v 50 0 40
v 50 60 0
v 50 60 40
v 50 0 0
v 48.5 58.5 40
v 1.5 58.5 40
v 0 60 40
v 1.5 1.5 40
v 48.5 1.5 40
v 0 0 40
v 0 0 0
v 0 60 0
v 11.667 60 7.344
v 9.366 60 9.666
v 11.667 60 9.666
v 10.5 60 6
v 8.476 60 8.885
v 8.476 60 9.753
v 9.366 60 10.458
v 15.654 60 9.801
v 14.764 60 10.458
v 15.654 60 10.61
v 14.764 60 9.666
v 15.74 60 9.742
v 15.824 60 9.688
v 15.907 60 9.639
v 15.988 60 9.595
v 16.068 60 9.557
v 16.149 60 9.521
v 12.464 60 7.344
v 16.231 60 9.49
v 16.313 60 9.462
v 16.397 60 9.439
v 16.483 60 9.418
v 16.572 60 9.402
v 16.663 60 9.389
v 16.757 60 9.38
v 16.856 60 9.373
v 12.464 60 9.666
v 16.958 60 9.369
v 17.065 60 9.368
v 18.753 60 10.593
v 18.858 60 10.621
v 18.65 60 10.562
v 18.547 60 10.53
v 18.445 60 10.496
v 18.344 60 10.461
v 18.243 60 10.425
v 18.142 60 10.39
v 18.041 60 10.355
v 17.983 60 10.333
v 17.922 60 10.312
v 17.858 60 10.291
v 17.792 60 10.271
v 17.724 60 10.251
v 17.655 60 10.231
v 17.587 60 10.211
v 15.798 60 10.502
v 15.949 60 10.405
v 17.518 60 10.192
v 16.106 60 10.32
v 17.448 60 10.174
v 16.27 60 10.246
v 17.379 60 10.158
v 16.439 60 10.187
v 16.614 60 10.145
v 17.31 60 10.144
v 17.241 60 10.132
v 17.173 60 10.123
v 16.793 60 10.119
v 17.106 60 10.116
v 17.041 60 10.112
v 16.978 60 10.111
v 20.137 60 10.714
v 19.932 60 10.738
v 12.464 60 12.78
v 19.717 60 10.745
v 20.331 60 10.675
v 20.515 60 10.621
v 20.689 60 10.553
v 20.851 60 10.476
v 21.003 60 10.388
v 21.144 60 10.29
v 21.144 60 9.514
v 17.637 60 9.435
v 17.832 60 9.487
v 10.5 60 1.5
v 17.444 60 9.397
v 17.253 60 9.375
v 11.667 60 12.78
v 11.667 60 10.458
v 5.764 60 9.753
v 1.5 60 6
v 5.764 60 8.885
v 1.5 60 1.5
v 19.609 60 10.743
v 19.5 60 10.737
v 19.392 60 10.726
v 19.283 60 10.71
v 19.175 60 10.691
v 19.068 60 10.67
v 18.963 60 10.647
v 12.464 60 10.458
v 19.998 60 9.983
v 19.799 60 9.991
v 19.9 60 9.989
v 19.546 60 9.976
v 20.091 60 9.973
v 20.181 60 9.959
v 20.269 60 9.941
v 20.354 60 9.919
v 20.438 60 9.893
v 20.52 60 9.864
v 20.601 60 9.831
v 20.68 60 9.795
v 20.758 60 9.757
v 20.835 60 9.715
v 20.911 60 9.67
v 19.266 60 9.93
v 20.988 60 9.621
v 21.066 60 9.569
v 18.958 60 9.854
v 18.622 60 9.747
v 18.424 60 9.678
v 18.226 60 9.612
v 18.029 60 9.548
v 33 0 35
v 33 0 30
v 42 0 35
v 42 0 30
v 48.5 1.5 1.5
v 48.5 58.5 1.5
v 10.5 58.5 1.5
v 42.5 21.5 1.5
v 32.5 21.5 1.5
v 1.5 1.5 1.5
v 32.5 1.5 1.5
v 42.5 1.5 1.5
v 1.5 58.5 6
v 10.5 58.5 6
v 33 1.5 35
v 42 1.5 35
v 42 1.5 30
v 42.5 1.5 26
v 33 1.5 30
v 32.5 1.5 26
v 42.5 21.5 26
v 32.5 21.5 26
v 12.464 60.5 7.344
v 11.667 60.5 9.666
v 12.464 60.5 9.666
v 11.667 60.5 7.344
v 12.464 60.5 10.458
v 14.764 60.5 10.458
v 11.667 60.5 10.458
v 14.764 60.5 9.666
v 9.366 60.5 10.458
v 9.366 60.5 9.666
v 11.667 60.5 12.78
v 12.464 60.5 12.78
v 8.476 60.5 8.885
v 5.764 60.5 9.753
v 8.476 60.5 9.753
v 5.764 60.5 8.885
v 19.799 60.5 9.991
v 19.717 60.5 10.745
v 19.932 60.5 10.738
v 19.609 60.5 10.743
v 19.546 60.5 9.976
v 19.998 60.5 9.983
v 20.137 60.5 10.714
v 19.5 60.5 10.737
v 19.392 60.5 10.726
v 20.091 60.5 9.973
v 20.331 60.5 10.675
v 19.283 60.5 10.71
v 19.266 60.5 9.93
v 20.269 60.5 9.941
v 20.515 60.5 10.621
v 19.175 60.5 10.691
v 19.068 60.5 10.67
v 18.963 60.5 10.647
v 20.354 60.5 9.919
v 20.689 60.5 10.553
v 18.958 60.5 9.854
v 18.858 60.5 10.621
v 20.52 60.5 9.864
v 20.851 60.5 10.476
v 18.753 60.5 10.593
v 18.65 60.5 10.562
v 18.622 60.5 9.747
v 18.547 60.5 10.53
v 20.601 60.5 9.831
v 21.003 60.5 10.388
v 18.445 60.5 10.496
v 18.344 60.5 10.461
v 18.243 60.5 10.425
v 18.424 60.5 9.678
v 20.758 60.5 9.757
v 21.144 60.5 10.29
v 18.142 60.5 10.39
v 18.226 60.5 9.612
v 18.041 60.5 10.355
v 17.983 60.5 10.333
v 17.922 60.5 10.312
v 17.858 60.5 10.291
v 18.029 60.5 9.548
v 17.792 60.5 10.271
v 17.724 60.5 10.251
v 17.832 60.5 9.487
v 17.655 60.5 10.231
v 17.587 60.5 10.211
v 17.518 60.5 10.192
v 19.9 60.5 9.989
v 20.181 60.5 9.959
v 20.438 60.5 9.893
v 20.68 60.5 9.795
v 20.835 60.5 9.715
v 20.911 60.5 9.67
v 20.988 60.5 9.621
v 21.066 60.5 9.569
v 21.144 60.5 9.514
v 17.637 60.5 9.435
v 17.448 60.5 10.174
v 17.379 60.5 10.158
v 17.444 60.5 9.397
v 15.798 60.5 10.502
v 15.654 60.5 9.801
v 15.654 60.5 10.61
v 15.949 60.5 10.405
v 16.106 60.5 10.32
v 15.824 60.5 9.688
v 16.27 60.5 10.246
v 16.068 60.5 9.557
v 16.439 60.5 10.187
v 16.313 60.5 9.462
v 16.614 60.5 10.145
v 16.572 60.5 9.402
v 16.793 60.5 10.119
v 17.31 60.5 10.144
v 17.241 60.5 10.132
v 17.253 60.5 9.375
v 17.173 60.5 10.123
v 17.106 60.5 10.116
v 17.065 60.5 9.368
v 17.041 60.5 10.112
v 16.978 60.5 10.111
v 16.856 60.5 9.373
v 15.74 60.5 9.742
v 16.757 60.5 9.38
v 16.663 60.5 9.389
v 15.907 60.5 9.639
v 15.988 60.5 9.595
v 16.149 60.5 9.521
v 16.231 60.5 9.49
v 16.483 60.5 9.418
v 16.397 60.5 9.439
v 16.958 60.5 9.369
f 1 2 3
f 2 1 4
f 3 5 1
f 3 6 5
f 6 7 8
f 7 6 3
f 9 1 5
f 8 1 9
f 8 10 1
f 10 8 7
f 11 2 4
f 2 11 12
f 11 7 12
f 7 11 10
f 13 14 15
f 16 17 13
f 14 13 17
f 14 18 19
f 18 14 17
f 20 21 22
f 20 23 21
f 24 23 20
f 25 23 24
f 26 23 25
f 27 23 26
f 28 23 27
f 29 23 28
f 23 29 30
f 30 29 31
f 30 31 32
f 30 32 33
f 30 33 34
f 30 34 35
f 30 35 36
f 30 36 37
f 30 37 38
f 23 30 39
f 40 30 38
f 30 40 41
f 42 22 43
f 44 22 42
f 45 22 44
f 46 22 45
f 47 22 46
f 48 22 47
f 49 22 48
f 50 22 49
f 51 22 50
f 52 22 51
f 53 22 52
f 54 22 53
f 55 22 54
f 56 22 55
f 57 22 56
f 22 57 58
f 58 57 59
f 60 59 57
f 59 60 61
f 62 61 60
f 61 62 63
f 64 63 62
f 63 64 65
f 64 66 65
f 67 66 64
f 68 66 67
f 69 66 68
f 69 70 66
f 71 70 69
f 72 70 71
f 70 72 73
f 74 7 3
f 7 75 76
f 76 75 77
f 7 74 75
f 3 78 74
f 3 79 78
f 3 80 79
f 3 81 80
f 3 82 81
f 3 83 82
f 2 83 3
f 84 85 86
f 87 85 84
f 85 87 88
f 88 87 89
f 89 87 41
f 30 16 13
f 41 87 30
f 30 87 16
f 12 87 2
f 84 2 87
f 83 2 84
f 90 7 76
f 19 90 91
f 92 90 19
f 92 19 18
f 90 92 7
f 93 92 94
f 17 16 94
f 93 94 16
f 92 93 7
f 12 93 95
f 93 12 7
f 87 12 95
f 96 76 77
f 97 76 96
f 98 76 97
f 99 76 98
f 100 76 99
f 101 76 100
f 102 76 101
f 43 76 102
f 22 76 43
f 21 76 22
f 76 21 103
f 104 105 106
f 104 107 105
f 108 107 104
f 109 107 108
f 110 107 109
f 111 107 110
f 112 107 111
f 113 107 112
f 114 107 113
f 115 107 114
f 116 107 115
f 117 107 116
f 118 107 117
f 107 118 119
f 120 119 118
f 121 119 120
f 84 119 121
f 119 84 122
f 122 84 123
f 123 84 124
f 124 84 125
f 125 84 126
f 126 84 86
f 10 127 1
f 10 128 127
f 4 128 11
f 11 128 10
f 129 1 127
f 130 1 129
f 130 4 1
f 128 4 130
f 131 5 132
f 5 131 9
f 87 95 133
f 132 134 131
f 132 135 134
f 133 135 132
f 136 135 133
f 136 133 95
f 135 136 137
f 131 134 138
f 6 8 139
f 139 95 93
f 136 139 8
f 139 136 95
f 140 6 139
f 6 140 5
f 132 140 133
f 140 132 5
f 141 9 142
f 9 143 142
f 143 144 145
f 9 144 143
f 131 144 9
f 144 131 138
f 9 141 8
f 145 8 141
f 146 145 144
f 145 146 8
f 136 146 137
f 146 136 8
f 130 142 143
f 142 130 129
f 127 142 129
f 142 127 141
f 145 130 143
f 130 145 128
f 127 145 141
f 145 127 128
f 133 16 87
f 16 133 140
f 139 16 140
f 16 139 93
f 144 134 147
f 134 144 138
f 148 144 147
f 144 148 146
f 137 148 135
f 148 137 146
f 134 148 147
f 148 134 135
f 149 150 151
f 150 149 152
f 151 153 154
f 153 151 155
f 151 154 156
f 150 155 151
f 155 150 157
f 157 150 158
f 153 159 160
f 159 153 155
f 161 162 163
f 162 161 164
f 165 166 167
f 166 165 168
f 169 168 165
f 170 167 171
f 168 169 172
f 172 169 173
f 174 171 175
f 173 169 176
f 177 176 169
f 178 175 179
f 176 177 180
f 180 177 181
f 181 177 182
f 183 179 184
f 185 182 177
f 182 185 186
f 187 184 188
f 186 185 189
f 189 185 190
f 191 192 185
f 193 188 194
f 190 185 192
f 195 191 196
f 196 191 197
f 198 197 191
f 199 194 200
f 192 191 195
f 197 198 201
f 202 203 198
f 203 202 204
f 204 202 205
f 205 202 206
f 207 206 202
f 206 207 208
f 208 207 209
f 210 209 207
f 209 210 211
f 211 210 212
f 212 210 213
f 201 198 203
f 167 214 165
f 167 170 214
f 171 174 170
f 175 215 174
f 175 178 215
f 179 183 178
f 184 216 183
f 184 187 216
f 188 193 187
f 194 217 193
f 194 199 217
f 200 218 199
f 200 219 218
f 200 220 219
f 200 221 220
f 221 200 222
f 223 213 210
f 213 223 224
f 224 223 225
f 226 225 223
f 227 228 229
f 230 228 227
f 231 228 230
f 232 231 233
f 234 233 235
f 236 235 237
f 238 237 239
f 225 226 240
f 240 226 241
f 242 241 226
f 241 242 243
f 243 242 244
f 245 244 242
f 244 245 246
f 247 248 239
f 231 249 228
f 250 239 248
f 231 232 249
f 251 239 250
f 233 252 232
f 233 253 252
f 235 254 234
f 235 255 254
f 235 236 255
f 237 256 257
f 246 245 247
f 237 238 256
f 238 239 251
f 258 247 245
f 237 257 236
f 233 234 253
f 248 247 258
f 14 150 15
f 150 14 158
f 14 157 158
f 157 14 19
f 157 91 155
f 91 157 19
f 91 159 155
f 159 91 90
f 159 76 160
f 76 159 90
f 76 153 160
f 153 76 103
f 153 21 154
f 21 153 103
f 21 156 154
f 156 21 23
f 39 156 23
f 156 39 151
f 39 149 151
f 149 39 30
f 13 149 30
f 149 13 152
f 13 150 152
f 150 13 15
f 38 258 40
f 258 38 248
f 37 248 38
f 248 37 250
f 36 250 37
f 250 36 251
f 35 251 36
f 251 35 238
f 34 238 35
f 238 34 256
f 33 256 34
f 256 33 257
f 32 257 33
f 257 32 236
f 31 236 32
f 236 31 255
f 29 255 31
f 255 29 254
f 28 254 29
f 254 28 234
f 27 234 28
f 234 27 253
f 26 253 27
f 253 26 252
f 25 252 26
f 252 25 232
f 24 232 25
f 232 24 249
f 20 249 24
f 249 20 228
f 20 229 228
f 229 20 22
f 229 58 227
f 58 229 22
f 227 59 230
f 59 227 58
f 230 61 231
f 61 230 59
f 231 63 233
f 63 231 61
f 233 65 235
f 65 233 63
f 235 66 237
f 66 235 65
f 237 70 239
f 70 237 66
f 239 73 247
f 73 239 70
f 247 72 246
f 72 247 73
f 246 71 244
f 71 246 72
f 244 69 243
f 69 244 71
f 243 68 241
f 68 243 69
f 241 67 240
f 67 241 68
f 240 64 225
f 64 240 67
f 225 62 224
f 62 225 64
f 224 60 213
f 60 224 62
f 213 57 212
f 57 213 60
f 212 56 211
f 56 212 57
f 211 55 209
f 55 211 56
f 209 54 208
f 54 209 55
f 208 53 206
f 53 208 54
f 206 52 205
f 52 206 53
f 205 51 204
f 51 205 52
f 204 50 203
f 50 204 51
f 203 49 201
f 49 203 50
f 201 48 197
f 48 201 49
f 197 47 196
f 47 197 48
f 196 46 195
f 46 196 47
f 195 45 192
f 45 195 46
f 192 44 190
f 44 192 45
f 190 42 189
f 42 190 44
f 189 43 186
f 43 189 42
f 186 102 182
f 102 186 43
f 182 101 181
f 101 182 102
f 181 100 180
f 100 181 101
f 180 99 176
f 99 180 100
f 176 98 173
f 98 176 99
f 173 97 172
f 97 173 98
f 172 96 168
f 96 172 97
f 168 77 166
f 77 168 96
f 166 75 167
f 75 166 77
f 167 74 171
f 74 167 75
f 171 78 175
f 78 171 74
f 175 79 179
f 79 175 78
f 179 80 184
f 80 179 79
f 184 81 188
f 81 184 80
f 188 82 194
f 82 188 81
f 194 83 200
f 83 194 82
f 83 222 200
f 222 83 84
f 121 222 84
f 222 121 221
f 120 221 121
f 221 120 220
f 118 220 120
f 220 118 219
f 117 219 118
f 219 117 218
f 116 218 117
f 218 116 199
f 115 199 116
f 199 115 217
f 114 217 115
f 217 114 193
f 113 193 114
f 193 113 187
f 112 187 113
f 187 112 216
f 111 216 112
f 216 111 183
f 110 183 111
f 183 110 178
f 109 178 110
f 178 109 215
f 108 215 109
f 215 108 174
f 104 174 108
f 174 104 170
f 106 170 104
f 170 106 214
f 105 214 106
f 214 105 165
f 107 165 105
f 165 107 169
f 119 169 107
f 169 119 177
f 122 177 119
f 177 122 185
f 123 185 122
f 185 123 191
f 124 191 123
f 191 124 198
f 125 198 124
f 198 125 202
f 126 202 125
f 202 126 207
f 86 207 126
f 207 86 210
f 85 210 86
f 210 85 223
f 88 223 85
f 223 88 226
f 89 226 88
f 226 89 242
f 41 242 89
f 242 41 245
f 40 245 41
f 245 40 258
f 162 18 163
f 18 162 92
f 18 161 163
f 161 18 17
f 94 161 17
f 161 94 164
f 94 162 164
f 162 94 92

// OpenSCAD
wall=1.5;
eps = 0.01;

module box_bottom()
{
  size = [50, 60, 40];
  difference()
  {
    cube(size);
    translate(wall*[1,1,1])
      cube(size-wall*[2,2,0]);
    // arduino USB socket
    translate([size[0]-8-9, -eps, 30])
      cube([9, 2*eps+wall, 5]);
    // servo wires
    translate([wall, size[1]-wall-eps, wall])
      cube([9, 3, 3*wall]);
  }
  // arduino support
  translate([50-8-9-0.5, wall, 0])
    cube([10, 20, 26]);
  // servo info note
  color("blue")
  translate([wall+12, size[1]+0.5, wall+8])
    rotate([90, 0, 0])
      mirror([1, 0, 0])
        linear_extrude(1)
          text("~+-", size=8, valign="center", halign="center");
}

box_bottom();
